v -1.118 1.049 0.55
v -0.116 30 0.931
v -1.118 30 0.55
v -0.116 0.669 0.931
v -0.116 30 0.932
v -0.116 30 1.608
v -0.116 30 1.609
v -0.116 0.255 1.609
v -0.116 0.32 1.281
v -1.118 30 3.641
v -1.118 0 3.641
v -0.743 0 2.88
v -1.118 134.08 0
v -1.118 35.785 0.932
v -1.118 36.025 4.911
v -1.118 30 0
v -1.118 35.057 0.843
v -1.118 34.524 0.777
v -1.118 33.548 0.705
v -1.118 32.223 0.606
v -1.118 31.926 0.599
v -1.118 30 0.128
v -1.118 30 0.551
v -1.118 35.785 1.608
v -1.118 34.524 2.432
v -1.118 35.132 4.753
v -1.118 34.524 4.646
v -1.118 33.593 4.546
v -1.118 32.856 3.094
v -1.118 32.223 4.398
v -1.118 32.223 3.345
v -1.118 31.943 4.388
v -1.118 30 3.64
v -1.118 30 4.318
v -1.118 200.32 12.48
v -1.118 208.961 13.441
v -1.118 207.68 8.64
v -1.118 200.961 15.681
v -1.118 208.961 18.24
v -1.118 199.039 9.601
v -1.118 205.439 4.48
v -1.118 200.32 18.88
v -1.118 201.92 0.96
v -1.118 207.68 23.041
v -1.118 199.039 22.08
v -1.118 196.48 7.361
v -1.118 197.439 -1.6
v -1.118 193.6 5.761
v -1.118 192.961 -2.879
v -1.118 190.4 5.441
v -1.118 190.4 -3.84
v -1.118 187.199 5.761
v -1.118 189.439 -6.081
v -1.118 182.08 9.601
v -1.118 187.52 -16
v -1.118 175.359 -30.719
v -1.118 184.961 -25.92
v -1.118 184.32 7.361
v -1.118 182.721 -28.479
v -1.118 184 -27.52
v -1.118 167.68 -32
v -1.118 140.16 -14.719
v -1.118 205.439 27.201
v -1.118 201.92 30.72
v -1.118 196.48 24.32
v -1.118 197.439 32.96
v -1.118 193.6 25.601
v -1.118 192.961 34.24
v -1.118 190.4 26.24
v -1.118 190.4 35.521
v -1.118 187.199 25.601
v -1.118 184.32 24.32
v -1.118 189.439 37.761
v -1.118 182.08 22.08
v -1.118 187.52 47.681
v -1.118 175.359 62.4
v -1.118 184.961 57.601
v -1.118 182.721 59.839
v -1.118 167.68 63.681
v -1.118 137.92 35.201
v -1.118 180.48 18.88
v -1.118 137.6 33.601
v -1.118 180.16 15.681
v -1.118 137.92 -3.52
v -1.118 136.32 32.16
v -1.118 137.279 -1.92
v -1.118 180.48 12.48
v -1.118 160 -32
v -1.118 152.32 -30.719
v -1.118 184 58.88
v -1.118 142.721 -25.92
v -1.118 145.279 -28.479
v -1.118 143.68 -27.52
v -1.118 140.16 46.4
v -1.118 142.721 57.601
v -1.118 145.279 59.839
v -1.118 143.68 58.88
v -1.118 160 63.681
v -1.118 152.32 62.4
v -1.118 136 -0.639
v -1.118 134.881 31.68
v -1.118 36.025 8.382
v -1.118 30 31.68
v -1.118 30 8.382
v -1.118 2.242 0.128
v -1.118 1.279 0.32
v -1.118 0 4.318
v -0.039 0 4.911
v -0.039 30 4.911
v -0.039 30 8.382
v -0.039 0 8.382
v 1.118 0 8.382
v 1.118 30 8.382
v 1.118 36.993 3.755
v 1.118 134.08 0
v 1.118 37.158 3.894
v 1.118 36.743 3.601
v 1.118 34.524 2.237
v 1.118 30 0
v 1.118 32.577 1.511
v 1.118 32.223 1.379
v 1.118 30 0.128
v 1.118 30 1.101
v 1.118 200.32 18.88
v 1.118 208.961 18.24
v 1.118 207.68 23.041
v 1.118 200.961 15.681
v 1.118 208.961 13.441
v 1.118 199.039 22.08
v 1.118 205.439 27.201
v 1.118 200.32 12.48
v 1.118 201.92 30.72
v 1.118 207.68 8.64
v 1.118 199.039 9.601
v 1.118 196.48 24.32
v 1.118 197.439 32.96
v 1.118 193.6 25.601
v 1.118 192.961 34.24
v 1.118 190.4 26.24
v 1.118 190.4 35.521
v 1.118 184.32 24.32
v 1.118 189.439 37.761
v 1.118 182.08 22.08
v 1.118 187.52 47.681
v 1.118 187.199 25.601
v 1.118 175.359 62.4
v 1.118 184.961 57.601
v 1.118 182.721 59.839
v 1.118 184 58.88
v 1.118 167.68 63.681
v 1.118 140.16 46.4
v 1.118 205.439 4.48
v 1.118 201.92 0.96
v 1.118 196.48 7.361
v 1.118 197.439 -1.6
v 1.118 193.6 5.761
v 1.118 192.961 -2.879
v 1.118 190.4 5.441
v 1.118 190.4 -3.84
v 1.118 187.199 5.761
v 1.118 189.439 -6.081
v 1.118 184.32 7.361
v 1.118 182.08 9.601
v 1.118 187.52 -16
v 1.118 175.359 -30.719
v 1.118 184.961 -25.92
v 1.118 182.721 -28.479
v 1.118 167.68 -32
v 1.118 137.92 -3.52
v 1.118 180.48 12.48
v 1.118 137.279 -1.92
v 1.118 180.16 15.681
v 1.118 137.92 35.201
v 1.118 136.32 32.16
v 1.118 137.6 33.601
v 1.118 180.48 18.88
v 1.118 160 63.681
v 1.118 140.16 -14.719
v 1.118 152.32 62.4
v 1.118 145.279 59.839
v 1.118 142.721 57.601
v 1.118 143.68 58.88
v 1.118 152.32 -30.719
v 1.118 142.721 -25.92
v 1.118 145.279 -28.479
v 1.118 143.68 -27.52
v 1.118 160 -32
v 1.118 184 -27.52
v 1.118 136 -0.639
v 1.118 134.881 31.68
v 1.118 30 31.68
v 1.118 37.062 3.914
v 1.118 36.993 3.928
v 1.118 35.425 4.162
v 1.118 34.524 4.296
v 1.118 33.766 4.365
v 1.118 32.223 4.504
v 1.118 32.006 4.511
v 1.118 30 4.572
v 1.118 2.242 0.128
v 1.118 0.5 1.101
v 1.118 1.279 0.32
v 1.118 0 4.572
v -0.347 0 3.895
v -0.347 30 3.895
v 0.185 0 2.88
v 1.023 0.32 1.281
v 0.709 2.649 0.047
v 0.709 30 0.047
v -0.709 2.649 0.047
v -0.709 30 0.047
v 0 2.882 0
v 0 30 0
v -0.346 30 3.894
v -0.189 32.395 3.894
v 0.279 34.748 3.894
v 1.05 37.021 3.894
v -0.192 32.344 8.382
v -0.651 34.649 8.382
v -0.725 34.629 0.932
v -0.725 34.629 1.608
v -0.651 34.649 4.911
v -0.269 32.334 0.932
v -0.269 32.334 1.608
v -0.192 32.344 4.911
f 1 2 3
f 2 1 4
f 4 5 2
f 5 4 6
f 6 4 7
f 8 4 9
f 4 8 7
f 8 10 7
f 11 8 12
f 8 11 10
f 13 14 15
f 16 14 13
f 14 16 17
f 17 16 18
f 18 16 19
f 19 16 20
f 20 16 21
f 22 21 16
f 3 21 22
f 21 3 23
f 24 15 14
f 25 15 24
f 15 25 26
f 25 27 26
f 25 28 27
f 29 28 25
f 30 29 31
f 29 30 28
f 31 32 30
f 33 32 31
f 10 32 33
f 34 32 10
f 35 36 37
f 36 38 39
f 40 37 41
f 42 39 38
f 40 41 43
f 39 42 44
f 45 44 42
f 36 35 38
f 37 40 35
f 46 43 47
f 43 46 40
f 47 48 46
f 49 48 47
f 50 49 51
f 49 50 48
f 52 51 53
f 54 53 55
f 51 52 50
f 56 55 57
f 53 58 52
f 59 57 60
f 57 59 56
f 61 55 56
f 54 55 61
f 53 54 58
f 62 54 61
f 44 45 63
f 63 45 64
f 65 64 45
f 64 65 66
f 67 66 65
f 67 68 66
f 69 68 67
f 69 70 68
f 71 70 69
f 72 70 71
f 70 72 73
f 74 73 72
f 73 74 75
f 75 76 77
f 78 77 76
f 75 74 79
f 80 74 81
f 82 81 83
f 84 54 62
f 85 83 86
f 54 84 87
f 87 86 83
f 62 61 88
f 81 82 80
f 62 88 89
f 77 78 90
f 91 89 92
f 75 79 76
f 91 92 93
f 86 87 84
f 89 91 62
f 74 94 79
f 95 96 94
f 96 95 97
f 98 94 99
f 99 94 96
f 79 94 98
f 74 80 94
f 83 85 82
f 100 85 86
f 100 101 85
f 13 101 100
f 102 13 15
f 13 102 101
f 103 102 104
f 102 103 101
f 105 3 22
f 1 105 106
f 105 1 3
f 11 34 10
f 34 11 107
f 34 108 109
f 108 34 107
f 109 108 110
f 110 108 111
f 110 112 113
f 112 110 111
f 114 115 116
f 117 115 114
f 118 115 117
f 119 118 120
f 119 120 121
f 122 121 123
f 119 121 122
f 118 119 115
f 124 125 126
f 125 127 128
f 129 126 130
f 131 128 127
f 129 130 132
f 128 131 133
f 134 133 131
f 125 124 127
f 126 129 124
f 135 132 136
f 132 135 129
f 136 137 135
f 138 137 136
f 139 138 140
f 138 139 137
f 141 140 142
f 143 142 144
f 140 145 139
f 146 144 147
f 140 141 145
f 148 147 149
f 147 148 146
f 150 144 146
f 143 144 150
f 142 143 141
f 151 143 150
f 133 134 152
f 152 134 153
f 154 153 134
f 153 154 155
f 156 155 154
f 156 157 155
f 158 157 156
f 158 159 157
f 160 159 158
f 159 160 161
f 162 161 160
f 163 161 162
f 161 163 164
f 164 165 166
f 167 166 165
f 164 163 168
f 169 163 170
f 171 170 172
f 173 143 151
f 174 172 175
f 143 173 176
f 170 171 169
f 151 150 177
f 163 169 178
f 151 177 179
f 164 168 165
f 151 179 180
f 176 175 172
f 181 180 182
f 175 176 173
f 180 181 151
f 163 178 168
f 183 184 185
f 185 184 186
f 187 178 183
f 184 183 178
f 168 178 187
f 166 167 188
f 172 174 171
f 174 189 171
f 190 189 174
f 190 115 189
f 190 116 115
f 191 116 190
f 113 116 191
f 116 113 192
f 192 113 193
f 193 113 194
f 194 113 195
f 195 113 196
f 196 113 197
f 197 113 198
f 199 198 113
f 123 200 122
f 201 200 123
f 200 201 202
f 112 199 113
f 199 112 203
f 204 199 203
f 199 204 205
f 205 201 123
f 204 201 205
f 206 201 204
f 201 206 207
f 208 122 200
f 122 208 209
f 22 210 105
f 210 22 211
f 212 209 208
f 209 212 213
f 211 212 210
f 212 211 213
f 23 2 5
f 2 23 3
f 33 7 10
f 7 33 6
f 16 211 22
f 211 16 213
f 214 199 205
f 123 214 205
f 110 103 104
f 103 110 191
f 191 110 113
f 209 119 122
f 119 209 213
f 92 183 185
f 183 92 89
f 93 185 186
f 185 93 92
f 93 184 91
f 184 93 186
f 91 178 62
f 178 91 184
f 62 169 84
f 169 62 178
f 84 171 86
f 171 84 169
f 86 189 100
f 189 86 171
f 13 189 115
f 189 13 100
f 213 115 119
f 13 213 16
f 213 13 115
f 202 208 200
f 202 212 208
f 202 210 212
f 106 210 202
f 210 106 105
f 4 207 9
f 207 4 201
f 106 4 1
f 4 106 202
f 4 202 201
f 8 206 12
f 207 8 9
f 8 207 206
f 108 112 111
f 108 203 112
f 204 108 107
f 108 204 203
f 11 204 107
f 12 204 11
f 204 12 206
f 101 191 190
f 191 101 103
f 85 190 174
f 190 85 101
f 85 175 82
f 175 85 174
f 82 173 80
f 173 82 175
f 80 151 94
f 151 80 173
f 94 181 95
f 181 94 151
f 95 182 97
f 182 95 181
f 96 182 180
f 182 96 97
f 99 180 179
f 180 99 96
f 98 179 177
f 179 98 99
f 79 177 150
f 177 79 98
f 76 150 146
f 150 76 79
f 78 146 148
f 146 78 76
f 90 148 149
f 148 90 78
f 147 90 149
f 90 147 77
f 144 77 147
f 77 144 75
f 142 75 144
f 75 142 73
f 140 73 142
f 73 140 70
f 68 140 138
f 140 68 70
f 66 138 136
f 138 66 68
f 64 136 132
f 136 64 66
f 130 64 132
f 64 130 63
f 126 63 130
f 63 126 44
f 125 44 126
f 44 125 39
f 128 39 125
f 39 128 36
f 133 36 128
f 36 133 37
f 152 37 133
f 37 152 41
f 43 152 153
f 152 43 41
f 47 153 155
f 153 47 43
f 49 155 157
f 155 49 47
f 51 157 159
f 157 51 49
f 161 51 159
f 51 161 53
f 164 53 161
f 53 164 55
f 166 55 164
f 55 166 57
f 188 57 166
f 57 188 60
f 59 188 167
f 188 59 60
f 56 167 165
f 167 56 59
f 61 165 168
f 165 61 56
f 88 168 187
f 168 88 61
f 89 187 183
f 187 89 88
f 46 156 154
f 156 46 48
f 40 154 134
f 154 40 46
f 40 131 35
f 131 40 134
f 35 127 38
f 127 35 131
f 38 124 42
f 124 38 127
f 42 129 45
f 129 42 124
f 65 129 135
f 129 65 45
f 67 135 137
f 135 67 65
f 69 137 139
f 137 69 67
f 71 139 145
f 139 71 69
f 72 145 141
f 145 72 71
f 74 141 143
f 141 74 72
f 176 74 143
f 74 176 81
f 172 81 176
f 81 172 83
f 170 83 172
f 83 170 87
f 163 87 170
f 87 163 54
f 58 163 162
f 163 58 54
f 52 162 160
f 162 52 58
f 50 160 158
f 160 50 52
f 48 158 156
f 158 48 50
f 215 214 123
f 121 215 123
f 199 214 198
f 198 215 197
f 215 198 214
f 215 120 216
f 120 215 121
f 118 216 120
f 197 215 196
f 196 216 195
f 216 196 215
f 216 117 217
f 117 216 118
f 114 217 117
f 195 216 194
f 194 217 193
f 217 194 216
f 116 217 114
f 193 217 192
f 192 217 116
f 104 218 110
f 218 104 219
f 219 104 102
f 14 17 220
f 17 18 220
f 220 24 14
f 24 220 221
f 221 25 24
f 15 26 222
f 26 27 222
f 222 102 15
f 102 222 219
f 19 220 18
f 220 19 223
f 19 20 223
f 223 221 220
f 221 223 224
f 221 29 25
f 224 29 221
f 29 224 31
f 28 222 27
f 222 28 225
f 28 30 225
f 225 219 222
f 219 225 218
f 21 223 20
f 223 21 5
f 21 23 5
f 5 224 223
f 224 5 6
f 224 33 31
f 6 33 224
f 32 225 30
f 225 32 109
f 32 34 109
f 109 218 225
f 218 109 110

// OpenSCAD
// file: keygen.scad
$inf=1000;
$eps=.001;

function key_move(points, offset) = [
    for(p=points) [p[0] + offset[0],
                   p[1] + offset[1]]
];

module key_outline(outline_points, thickness, outline_paths=undef) {
    rotate(-90, [0, 1, 0]) rotate(-90, [0, 0, 1]) // Rotate into the correct plane
        linear_extrude(height=thickness, center=true) // Extrude the key outline
            polygon(points=outline_points, paths=outline_paths); // Draw the outline
}

module key_blade(warding, plug_diameter=0) {
    // Draw the blade to infinity in Y
    // optionally intersected with the plug cylinder
    // to round the bottom
    intersection() {
        rotate(180, [0, 0, 1]) rotate(90, [1, 0, 0])
            linear_extrude(height=2*$inf, center=true)
                polygon(warding);

        // Draw the plug, if a plug diameter is specified
        if(plug_diameter > 0) {
            // Draw infinite cylinder in -Y
            translate([0, 0, 0.5*plug_diameter]) rotate(90, [1, 0, 0])
                cylinder(r=0.5*plug_diameter, h=$inf, center=true, $fn=$fn ? 4*$fn : 48);
        }
    }
}

module key_x_line(length) {
    // Hack to draw something close to a line in X
    // since OpenSCAD does not support line primitives
    square([length, $eps], center=true);
}

module key_warding_cutter(warding, blade_height, cutter_radius, left) {
    neg = left ? -1 : 1;
    translate([neg * cutter_radius, 0, 0])
        rotate_extrude($fn=$fn ? 4*$fn : 48)
            translate([neg * cutter_radius, 0])
                difference() {
                    translate([0, 0.5*blade_height])
                        square([2 * cutter_radius, blade_height], center=true);
                    minkowski() {
                        translate([neg * 1.5 * cutter_radius, 0])
                            key_x_line(3 * cutter_radius);
                        polygon(warding);
                    }
                    polygon(warding);
                }
}

module key_engrave(engrave_points, engrave_depth, left, thickness, engrave_paths=undef) {
    translate([(left ? -1 : 1) * 0.5*thickness, 0, 0]) rotate(-90, [0, 1, 0]) rotate(-90, [0, 0, 1]) // Translate and rotate into the correct soot
        linear_extrude(height=2*engrave_depth, center=true) // Extrude the key outline
            polygon(points=engrave_points, paths=engrave_paths); // Draw the outline
}

module key_blank(outline_points,
                warding,
                outline_paths=undef,
                engrave_right_points=[],
                engrave_right_paths=undef,
                engrave_left_points=[],
                engrave_left_paths=undef,
                bow_thickness=0,
                engrave_depth=.1,
                plug_diameter=0,
                offset=[0, 0],
                cutter_radius=18,
                milling_offset=0) {

    // Find the bounding box of the warding
    warding_min = [min([for(e=warding) e[0]]), min([for(e=warding) e[1]])];
    warding_max = [max([for(e=warding) e[0]]), max([for(e=warding) e[1]])];

    // Apply the given offset to the outline,
    // holes, and engrave
    outline_adj = key_move(outline_points, offset);
    engrave_left_adj = key_move(engrave_left_points, offset);
    engrave_right_adj = key_move(engrave_right_points, offset);

    // Move the warding profile
    // so that it is centered in X
    // and non-negative in Y
    warding_offset = [-0.5 * (warding_min[0] + warding_max[0]),
                      -warding_min[1]];
    warding_adj = key_move(warding, warding_offset);

    // Infer various key properties
    thickness = (bow_thickness == 0) ? abs(warding_max[0] - warding_min[0]) : bow_thickness;
    blade_height = abs(warding_max[1] - warding_min[1]);

    // Cut out the warding milling artifacts
    // from the bow
    difference() {
        // Create the bulk of the keyblank
        // by intersecting the outline
        // with the warding profile
        // and the plug
        intersection() {
            // Draw the key outline and holes
            key_outline(outline_adj, thickness, outline_paths);
            
            // Draw the blade, and a giant box where the bow is
            // so that we don't wipe out the bow
            // when the intersection happens
            union() {
                // Fill +Y half-space
                translate([0, $inf/2+milling_offset, 0])
                    cube([$inf, $inf, $inf], center=true);

                key_blade(warding_adj, plug_diameter);
            }
        }
        // Draw the milling wheels that cut the warding
        if(cutter_radius != 0) {
            translate([0, milling_offset, 0])
                union() {
                    key_warding_cutter(warding_adj, blade_height, cutter_radius, false);
                    key_warding_cutter(warding_adj, blade_height, cutter_radius, true);
                }
        }

        // Draw the engraveing
        key_engrave(engrave_right_adj, engrave_depth, false, thickness, engrave_right_paths);
        key_engrave(engrave_left_adj, engrave_depth, true, thickness, engrave_left_paths);
    }
}

function key_code_to_heights(code, depth_table) = [for(i=key_enum(code)) depth_table[search(code[i], "0123456789")[0]]];

module key_bitting_cutter(flat, angle, tool_height) {
    polygon([[-0.5 * flat, 0],
            [0.5 * flat, 0],
            [0.5 * flat + tan(0.5 * angle) * tool_height, tool_height],
            [-0.5 * flat - tan(0.5 * angle) * tool_height, tool_height]]);
}

module key_bitting(heights,
                   locations,
                   flat,
                   angle=100,
                   cutter_width=5,
                   cutter_height=5,
                   angles=[]) {
    // Rotate the cutting tool to the proper orientation
    rotate(-90, [0, 0, 1]) rotate(90, [1, 0, 0])
        // Union together a handful of trapezoids
        // that comprise the cuts
        union() {
            for(i=key_enum(heights)) {
                // Move to the proper location and height, and maybe rotate
                translate([locations[i], heights[i]]) rotate(i >= len(angles) ? 0 : angles[i], [0, 1, 0])
                    linear_extrude(height=cutter_width, center=true)
                        key_bitting_cutter(flat, angle, cutter_height);
            }
        }
}

function key_lkup(ks, vs, k) = vs[search([k], [for(ki=ks) [ki]])[0]];
    
function key_enum(l) = len(l) > 0 ? [for(i=[0:len(l)-1]) i] : [];

function _strcat(v, i, car, s) = (i==s ? v[i] : str(_strcat(v, i-1, car, s), str(car,v[i]) )); // from https://www.thingiverse.com/thing:202724

function _strslice(l, start, stop) =
        stop > start
        ? _strcat([for(i=[start:stop]) l[i]], stop-start, "", 0)
        : "";

function key_split_on_dash(s) = [
    for(i=[0:len(search("-", s, 0)[0])])
        _strslice(s, search("-", str("-", s), 0)[0][i], search("-", str(s, "-"), 0)[0][i]-1)
];
// main file
use <keygen.scad>
include <best.gen.scad>

module best(bitting="",
            outline_name="1A Standard",
            warding_name="A") {

    name = "Best SFIC";

    /*
        Bitting is specified from tip to bow, 0-9, with 0 being the shallowest cut and 9 being the deepest.
        Example: 2536326
    */

    outlines_k = ["1A Standard"];
    outlines_v = [[outline_points, outline_paths,
                   [-outline_points[42][0], -outline_points[37][1]],
                   engrave_points,
                   engrave_paths]];
    wardings_k = ["A",
                  "B",
                  "C",
                  "FM"];
    wardings_v = [warding_a_points,
                  warding_b_points,
                  warding_c_points,
                  warding_fm_points];

    outline_param = key_lkup(outlines_k, outlines_v, outline_name);
    outline_points = outline_param[0];
    outline_paths = outline_param[1];
    offset = outline_param[2];
    engrave_points = outline_param[3];
    engrave_paths = outline_param[4];

    warding_points = key_lkup(wardings_k, wardings_v, warding_name);

    // Best A2 system    
    cut_locations = [for(i=[.080, .230, .380, .530, .680, .830, .980]) -i*25.4];
    depth_table = [for(i=[0.318:-0.0125:0.205]) i*25.4];

    heights = key_code_to_heights(bitting, depth_table);

    difference() {
        if($children == 0) {
            key_blank(outline_points,
                      warding_points,
                      outline_paths=outline_paths,
                      //engrave_right_points=engrave_points,
                      //engrave_right_paths=engrave_paths,
                      //engrave_left_points=engrave_points,
                      //engrave_left_paths=engrave_paths,
                      offset=offset,
                      milling_offset=30,
                      plug_diameter=10.8712);
        } else {
            children(0);
        }
        key_bitting(heights, cut_locations, .7874);
    }
}

// Defaults
bitting="";
outline="1A Standard";
warding="A";
best(bitting, outline, warding);
